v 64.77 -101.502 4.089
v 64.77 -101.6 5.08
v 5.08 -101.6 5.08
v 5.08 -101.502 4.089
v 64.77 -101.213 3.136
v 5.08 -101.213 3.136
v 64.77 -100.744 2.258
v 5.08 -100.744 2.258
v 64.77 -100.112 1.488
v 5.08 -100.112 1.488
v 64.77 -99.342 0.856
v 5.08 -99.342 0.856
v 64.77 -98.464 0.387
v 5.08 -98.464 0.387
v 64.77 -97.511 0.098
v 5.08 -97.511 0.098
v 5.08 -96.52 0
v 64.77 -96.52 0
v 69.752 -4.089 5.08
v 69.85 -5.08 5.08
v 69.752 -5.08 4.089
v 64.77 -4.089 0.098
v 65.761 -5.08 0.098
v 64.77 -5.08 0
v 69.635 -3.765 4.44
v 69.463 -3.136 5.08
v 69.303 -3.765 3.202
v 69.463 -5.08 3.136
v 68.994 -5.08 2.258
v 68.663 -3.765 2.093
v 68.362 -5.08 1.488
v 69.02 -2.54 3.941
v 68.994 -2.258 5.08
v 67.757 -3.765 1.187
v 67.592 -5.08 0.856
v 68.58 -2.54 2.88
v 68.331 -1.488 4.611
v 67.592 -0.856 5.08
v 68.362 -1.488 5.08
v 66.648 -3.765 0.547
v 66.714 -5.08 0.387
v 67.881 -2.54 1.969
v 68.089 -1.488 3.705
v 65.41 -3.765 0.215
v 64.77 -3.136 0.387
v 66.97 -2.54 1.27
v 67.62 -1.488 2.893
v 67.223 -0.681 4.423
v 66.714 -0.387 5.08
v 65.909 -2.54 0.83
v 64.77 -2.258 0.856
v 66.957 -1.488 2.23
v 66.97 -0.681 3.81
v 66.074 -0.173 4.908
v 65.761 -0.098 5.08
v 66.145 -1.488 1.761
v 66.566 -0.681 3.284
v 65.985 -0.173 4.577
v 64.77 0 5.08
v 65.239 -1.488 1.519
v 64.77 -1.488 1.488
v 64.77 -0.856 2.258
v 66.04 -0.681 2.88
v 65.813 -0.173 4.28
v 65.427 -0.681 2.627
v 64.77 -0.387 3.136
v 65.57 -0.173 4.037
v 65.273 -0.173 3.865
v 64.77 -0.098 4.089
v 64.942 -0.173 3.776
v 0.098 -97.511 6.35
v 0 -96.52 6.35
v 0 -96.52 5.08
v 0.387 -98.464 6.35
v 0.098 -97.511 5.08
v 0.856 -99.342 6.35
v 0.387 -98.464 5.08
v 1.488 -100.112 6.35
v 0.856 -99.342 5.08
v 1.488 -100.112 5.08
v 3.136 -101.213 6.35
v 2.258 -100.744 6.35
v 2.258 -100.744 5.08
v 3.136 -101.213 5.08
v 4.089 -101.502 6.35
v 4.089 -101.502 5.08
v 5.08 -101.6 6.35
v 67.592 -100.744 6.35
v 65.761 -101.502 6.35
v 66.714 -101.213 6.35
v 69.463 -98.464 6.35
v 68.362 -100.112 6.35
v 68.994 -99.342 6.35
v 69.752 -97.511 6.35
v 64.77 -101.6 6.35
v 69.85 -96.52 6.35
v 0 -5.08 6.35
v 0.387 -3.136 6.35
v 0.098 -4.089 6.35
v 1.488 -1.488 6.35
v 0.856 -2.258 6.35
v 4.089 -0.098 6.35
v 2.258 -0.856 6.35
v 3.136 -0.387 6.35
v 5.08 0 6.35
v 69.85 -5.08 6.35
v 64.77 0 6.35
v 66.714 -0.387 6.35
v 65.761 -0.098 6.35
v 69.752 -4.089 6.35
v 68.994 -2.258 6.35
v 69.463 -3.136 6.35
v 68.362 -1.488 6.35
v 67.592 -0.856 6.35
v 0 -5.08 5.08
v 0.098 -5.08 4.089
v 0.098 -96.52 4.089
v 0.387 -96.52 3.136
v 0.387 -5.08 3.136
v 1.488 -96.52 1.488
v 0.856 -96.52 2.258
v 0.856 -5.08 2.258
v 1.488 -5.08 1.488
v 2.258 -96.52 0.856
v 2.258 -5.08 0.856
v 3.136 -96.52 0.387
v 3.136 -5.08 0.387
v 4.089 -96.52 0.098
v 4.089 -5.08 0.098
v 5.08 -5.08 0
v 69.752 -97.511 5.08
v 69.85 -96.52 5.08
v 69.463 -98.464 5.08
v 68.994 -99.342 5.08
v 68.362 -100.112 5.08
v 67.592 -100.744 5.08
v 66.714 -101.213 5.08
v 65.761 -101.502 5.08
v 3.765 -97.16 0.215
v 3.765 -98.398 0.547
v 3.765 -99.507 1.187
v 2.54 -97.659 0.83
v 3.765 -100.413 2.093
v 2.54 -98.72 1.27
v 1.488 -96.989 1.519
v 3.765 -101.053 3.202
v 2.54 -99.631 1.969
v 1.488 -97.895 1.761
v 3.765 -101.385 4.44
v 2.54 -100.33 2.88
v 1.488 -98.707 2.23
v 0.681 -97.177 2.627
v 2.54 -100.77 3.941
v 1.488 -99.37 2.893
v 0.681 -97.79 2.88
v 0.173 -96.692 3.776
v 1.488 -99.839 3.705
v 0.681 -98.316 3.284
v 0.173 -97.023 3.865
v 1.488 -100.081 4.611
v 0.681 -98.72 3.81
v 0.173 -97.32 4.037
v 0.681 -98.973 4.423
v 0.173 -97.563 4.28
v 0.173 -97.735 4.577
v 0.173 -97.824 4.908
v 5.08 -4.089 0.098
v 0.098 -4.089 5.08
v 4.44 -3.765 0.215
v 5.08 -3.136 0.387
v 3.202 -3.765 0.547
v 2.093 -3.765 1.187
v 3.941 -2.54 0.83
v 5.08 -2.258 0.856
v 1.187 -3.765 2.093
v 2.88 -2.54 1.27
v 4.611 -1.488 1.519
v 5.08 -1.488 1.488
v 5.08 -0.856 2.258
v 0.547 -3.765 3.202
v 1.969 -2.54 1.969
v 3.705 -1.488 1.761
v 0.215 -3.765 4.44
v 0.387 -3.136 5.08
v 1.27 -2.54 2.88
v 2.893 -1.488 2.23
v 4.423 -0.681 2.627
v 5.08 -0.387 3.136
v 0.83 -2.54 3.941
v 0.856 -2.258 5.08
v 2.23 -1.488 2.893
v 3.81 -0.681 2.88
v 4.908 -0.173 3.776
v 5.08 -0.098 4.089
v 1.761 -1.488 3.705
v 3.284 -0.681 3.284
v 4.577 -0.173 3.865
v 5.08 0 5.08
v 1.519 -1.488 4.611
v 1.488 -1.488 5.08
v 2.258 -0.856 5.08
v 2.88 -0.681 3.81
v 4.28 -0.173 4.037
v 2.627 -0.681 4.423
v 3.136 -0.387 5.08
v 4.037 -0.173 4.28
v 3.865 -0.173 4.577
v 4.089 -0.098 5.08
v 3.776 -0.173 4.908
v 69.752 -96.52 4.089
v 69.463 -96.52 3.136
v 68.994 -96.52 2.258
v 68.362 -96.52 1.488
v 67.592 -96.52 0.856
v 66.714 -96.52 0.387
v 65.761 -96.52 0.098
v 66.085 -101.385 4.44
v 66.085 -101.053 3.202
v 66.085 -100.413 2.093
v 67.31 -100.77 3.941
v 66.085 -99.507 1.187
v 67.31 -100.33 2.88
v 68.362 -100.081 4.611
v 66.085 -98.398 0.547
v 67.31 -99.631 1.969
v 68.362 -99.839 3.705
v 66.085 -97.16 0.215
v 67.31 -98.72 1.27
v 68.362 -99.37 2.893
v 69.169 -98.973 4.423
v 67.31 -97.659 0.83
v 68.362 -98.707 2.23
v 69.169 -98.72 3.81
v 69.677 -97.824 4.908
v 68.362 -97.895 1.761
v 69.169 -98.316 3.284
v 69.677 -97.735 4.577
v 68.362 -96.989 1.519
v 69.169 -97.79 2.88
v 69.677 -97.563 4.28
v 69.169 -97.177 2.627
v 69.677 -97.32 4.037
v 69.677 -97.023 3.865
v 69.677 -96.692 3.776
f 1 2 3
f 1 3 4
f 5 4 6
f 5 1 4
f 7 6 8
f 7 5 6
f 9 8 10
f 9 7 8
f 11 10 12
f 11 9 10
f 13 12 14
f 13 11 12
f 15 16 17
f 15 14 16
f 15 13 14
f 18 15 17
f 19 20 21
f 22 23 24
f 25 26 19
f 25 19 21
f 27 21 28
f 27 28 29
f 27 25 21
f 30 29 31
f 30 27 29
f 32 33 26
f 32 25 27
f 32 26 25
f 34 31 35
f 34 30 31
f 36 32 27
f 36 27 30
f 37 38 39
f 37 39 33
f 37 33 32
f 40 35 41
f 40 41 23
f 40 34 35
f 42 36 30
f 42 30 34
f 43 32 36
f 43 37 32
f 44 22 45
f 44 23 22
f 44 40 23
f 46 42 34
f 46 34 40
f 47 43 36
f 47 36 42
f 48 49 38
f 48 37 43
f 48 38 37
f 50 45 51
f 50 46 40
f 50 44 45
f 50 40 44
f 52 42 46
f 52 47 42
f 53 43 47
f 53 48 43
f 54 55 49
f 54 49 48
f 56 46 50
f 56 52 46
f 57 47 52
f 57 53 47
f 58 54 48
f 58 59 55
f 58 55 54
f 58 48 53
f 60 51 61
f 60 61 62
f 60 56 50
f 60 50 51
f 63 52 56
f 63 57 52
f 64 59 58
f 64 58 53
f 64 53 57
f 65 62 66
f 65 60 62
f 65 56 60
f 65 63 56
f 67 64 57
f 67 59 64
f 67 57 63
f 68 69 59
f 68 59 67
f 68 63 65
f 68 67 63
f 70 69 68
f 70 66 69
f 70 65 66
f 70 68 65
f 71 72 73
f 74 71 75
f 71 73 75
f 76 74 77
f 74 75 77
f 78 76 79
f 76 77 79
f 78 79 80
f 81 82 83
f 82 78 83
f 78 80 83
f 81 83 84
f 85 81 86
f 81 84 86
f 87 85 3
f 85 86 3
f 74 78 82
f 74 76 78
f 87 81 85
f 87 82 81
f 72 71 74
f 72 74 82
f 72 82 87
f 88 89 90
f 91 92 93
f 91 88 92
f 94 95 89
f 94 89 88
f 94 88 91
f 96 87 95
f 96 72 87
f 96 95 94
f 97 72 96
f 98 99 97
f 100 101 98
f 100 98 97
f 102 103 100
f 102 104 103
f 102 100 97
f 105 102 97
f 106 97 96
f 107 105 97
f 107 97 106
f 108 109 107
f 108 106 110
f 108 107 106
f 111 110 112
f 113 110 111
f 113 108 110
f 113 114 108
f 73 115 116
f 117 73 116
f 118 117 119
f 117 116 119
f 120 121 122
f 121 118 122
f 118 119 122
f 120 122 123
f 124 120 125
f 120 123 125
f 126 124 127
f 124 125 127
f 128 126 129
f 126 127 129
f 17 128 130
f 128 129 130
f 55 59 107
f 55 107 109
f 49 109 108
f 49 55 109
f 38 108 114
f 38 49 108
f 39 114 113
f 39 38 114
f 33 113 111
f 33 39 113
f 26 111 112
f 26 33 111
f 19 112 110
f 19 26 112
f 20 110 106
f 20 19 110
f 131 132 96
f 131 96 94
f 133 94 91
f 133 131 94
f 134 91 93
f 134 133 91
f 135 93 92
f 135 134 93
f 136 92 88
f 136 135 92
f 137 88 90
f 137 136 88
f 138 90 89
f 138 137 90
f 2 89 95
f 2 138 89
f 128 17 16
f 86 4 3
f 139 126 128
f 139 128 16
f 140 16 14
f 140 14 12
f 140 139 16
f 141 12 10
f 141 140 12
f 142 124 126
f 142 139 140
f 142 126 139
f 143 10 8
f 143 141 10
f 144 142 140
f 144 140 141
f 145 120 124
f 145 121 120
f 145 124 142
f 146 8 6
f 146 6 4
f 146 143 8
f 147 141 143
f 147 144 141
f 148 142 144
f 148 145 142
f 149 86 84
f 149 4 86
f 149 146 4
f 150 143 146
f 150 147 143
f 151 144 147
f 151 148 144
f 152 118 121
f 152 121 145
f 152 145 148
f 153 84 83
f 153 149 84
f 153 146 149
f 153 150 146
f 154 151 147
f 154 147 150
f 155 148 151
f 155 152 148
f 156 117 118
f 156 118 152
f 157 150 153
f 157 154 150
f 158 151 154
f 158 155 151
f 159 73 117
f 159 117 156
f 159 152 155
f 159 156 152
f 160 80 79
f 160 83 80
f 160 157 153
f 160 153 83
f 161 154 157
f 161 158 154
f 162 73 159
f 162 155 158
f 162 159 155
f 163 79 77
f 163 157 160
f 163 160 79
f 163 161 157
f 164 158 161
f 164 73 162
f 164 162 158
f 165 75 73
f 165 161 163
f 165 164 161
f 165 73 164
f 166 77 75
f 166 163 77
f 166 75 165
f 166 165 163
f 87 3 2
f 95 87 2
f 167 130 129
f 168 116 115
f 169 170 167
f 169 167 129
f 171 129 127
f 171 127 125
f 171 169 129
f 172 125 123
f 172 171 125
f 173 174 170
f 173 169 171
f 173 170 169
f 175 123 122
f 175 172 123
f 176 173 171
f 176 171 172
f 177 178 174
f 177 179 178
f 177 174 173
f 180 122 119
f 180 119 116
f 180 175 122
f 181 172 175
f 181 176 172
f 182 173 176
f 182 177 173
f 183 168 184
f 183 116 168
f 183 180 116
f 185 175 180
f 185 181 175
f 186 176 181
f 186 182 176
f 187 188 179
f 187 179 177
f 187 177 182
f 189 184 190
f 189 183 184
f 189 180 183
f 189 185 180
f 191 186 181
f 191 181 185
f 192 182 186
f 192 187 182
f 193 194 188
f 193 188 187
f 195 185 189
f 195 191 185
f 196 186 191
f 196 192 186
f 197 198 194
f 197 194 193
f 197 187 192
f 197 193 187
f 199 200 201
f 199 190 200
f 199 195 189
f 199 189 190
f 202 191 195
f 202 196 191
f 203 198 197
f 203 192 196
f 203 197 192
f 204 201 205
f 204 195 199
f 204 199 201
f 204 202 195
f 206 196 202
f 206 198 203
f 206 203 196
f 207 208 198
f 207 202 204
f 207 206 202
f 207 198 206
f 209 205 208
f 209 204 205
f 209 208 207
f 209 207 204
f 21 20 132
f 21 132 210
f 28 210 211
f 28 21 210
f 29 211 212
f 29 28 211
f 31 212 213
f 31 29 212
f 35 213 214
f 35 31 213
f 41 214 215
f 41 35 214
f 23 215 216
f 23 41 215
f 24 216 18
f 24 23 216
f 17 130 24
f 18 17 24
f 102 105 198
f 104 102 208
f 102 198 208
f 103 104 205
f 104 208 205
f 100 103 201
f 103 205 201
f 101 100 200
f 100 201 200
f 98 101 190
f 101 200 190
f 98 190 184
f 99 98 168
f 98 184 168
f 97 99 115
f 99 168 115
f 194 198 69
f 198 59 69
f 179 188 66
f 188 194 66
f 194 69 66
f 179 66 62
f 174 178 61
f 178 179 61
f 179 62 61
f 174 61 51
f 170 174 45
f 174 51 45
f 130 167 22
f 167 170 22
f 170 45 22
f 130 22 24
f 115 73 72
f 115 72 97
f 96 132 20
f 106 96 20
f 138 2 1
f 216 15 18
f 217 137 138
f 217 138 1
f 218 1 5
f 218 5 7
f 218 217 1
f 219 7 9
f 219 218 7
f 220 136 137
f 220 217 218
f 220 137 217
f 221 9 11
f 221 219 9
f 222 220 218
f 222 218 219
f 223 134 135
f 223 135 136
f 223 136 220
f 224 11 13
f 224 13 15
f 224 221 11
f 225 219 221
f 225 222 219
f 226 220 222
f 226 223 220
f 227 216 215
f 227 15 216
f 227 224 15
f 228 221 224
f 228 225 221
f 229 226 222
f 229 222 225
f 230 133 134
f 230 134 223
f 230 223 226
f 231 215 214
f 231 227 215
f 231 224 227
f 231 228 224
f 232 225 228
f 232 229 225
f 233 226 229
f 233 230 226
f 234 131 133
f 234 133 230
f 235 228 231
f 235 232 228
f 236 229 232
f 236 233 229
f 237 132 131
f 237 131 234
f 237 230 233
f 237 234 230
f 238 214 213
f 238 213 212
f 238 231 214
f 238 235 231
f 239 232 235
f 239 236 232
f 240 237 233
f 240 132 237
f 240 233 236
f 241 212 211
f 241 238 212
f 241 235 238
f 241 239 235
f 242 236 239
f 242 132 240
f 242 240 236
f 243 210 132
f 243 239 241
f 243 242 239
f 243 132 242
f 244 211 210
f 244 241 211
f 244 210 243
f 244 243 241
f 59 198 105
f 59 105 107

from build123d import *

# Parameters (mm, degrees)
F0_W         = 69.85
F0_H         = 101.6
F1_DEPTH     = 6.35
F2_R         = 5.08
F3_T1_DEPTH  = 13.97
F3_S5_W      = 5.08
F3_S5_H      = 5.08
F3_T6_DEPTH  = 5.08
F3_S11_W     = 5.08
F3_S11_H     = 5.08
F3_T12_DEPTH = 5.08
F3_S17_W     = 5.08
F3_S17_H     = 5.08
F3_T18_DEPTH = 5.08
F3_S23_W     = 5.08
F3_S23_H     = 5.08
F3_T24_DEPTH = 5.08


# Not quite as in the source:
# - a fillet or chamfer that OpenCascade refuses, or shapes differently, is made with other operations: its cross-section is extruded or revolved along the edge and cut away or added


with BuildPart() as f1:
    # F0 (on Top) → F1 (new body)
    with BuildSketch(Plane.XY):
        with Locations((34.925, -50.8)):
            Rectangle(F0_W, F0_H)
    extrude(amount=F1_DEPTH)

    # F2
    f2_edges = [f1.edges().sort_by_distance(p)[0] for p in [
        (69.85, -50.8, 0),
        (34.925, -101.6, 0),
        (0, -50.8, 0),
        (34.925, 0, 0),
    ]]
    fillet(f2_edges, radius=F2_R)

    # F3: fillet of radius 5.08 on 4 edges, made by hand

    # F3_s2 → F3_t1 (cut)
    with BuildSketch(Plane.XY.offset(5.08)):
        with BuildLine():
            ThreePointArc((0, -96.52), (1.4878975516, -100.1121024484), (5.08, -101.6))
            Line((5.08, -101.6), (0, -101.6))
            Line((0, -101.6), (0, -96.52))
        make_face()
        with BuildLine():
            ThreePointArc((64.77, 0), (68.3621024484, -1.4878975516), (69.85, -5.08))
            Line((69.85, -5.08), (69.85, 0))
            Line((69.85, 0), (64.77, 0))
        make_face()
        with BuildLine():
            ThreePointArc((5.08, 0), (1.4878975516, -1.4878975516), (0, -5.08))
            Line((0, -5.08), (0, 0))
            Line((0, 0), (5.08, 0))
        make_face()
        with BuildLine():
            ThreePointArc((69.85, -96.52), (68.3621024484, -100.1121024484), (64.77, -101.6))
            Line((64.77, -101.6), (69.85, -101.6))
            Line((69.85, -101.6), (69.85, -96.52))
        make_face()
    extrude(amount=F3_T1_DEPTH, mode=Mode.SUBTRACT)


with BuildPart() as f3_tool4:
    # F3_s5 → F3_t6 (new body)
    with BuildSketch(Plane.YZ.offset(64.77)):
        with Locations((-99.06, 2.54)):
            Rectangle(F3_S5_W, F3_S5_H)
    extrude(amount=F3_T6_DEPTH)

    # F3_s7 → F3_t8 (revolve, cut)
    with BuildSketch(Plane(origin=(64.77, -96.52, 5.08), x_dir=(0, 0.7071067812, 0.7071067812), z_dir=(0, 0.7071067812, -0.7071067812))):
        with BuildLine():
            ThreePointArc((0, -5.08), (5.08, 0), (0, 5.08))
            Line((0, 5.08), (0, -5.08))
        make_face()
    revolve(axis=Axis((64.77, -96.52, 5.08), (1, 0, 0)), mode=Mode.SUBTRACT)


with BuildPart() as f1_1:
    add(f1.part)

    # F3_t3: cut F3_tool4
    add(f3_tool4.part, mode=Mode.SUBTRACT)


with BuildPart() as f3_tool10:
    # F3_s11 → F3_t12 (new body)
    with BuildSketch(Plane.XZ.offset(5.08)):
        with Locations((2.54, 2.54)):
            Rectangle(F3_S11_W, F3_S11_H)
    extrude(amount=-F3_T12_DEPTH)

    # F3_s13 → F3_t14 (revolve, cut)
    with BuildSketch(Plane(origin=(5.08, -5.08, 5.08), x_dir=(0.7071067812, 0, 0.7071067812), z_dir=(-0.7071067812, 0, 0.7071067812))):
        with BuildLine():
            ThreePointArc((0, -5.08), (5.08, 0), (0, 5.08))
            Line((0, 5.08), (0, -5.08))
        make_face()
    revolve(axis=Axis((5.08, -5.08, 5.08), (0, 1, 0)), mode=Mode.SUBTRACT)


with BuildPart() as f1_2:
    add(f1_1.part)

    # F3_t9: cut F3_tool10
    add(f3_tool10.part, mode=Mode.SUBTRACT)


with BuildPart() as f3_tool16:
    # F3_s17 → F3_t18 (new body)
    with BuildSketch(Plane.XZ.offset(5.08)):
        with Locations((67.31, 2.54)):
            Rectangle(F3_S17_W, F3_S17_H)
    extrude(amount=-F3_T18_DEPTH)

    # F3_s19 → F3_t20 (revolve, cut)
    with BuildSketch(Plane(origin=(64.77, -5.08, 5.08), x_dir=(-0.7071067812, 0, 0.7071067812), z_dir=(-0.7071067812, 0, -0.7071067812))):
        with BuildLine():
            ThreePointArc((0, -5.08), (5.08, 0), (0, 5.08))
            Line((0, 5.08), (0, -5.08))
        make_face()
    revolve(axis=Axis((64.77, -5.08, 5.08), (0, 1, 0)), mode=Mode.SUBTRACT)


with BuildPart() as f1_3:
    add(f1_2.part)

    # F3_t15: cut F3_tool16
    add(f3_tool16.part, mode=Mode.SUBTRACT)


with BuildPart() as f3_tool22:
    # F3_s23 → F3_t24 (new body)
    with BuildSketch(Plane.YZ.offset(5.08)):
        with Locations((-99.06, 2.54)):
            Rectangle(F3_S23_W, F3_S23_H)
    extrude(amount=-F3_T24_DEPTH)

    # F3_s25 → F3_t26 (revolve, cut)
    with BuildSketch(Plane(origin=(5.08, -96.52, 5.08), x_dir=(0, 0.7071067812, 0.7071067812), z_dir=(0, -0.7071067812, 0.7071067812))):
        with BuildLine():
            ThreePointArc((0, -5.08), (5.08, 0), (0, 5.08))
            Line((0, 5.08), (0, -5.08))
        make_face()
    revolve(axis=Axis((5.08, -96.52, 5.08), (-1, 0, 0)), mode=Mode.SUBTRACT)


with BuildPart() as f1_4:
    add(f1_3.part)

    # F3_t21: cut F3_tool22
    add(f3_tool22.part, mode=Mode.SUBTRACT)


solid = f1_4.part
